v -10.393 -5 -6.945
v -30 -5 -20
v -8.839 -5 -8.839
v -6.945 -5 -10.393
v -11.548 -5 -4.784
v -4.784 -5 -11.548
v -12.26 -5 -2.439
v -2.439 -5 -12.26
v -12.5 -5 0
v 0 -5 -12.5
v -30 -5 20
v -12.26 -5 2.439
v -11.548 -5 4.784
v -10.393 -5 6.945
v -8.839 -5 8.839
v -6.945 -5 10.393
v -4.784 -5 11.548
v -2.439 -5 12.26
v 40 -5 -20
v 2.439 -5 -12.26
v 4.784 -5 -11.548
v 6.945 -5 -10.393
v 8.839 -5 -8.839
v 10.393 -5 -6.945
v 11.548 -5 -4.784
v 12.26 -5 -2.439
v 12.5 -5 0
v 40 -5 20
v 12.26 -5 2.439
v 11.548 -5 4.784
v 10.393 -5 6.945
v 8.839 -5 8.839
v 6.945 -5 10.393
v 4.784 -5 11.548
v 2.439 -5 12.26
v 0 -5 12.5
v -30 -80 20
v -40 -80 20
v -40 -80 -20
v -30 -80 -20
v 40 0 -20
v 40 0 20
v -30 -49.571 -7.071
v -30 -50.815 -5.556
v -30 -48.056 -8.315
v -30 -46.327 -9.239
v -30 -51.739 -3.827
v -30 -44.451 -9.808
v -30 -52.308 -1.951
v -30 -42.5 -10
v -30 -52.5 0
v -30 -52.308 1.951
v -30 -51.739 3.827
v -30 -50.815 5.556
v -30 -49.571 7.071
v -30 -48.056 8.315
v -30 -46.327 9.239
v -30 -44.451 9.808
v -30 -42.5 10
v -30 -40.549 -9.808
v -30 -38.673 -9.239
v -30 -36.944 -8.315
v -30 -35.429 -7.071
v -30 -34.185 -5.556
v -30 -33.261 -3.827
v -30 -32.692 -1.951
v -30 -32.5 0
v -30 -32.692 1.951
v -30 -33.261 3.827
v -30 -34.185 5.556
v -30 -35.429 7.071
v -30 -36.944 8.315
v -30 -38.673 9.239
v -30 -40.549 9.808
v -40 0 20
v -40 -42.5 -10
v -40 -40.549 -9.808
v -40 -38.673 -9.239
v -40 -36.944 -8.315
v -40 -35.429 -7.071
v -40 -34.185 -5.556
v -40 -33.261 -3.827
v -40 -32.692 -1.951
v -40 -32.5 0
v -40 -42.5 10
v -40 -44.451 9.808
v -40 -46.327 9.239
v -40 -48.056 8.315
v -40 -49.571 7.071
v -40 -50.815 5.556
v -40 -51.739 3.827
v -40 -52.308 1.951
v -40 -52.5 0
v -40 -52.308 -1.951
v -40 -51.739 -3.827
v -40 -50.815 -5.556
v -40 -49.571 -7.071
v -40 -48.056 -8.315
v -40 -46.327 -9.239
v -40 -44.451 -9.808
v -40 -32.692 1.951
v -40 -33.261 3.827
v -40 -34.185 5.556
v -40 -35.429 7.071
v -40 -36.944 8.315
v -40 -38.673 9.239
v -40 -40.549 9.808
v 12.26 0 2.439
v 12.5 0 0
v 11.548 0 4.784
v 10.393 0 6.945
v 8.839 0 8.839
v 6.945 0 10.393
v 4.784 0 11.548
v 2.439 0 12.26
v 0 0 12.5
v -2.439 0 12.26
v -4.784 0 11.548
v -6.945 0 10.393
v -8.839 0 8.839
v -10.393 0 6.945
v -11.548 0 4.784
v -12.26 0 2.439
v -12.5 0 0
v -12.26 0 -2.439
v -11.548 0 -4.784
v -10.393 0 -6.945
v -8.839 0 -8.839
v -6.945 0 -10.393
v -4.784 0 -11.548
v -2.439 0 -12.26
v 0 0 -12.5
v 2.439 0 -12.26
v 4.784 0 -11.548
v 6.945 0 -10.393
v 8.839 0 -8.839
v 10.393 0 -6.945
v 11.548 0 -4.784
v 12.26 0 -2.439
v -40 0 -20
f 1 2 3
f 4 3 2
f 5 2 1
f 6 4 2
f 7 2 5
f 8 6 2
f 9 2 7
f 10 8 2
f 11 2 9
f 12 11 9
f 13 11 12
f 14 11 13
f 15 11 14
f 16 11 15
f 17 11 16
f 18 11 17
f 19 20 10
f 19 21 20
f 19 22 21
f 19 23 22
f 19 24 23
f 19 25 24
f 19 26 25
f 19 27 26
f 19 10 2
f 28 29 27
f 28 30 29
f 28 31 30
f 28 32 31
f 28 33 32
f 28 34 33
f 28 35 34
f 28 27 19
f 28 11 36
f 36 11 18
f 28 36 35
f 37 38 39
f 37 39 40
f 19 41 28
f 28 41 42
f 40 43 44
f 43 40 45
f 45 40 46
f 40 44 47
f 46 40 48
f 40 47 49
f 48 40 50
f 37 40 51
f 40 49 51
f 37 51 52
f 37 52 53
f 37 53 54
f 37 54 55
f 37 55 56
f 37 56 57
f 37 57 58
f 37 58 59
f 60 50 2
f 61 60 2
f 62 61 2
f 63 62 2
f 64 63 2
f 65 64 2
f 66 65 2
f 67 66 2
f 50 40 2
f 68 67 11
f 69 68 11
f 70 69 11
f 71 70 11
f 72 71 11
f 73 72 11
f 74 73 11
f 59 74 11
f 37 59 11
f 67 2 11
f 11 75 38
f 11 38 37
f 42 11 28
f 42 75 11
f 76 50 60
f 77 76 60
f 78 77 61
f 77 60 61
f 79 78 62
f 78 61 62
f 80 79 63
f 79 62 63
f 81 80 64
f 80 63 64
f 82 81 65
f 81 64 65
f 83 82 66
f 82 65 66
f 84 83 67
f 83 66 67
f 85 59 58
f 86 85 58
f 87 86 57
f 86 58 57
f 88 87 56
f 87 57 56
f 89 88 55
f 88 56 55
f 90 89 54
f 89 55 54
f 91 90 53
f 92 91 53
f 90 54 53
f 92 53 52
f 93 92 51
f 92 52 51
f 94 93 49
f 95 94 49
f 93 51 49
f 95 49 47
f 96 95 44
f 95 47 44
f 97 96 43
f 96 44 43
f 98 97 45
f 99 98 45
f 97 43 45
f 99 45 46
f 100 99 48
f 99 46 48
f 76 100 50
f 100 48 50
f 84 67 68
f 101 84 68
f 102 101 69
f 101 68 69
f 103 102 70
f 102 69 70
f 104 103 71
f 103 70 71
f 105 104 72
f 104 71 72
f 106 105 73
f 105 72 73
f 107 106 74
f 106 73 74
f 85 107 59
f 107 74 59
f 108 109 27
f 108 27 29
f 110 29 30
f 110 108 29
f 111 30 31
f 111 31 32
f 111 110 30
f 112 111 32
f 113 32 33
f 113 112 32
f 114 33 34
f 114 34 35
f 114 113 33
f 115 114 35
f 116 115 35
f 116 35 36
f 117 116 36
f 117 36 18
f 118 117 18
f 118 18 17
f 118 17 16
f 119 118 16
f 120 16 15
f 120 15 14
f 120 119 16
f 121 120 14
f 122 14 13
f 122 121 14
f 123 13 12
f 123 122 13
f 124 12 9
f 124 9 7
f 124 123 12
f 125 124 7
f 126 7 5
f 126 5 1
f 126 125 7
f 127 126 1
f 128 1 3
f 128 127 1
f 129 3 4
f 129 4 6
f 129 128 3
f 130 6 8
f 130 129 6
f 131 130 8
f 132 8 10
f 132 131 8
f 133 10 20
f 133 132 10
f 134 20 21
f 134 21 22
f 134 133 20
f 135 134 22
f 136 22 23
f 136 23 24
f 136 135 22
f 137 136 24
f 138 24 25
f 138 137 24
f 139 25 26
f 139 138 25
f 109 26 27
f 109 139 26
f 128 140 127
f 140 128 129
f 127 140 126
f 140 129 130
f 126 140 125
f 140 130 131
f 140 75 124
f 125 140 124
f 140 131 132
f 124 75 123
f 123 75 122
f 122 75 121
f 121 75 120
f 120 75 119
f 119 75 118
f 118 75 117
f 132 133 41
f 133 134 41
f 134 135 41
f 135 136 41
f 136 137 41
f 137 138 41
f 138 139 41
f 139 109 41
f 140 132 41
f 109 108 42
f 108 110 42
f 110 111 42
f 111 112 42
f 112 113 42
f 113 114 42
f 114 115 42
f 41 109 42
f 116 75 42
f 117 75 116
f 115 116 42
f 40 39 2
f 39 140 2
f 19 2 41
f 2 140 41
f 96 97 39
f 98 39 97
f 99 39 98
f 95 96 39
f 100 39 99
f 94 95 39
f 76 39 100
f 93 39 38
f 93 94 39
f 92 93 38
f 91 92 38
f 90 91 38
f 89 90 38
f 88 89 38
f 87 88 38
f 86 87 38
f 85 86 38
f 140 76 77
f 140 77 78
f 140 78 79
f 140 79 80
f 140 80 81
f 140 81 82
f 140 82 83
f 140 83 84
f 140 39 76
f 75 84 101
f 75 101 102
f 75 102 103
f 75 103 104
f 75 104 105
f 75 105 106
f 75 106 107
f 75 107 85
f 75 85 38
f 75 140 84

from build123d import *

# Parameters (mm, degrees)
F0_W     = 80
F0_H     = 40
F0_R     = 12.5
F1_DEPTH = 5
F2_W     = 10
F2_H     = 40
F3_DEPTH = 75
F5_DEPTH = 10.001


with BuildPart() as f1:
    # F0 (on Front) → F1 (new body)
    with BuildSketch(Plane.XZ):
        Rectangle(F0_W, F0_H)
        Circle(F0_R, mode=Mode.SUBTRACT)
    extrude(amount=F1_DEPTH)

    # F2 (on face) → F3 (join)
    with BuildSketch(Plane.XZ.offset(5)):
        with Locations((-35, 0)):
            Rectangle(F2_W, F2_H)
    extrude(amount=F3_DEPTH)

    # F4 (on face) → F5 (cut, through all)
    with BuildSketch(Plane.YZ.offset(-30)):
        with BuildLine():
            ThreePointArc((-32.5, 0), (-35.4289321881, 7.0710678119), (-42.5, 10))
            Line((-42.5, 10), (-42.5, -10))
            ThreePointArc((-42.5, -10), (-35.4289321881, -7.0710678119), (-32.5, 0))
        make_face()
        with BuildLine():
            Line((-42.5, -10), (-42.5, 10))
            ThreePointArc((-42.5, 10), (-52.5, 0), (-42.5, -10))
        make_face()
    extrude(amount=-F5_DEPTH, mode=Mode.SUBTRACT)


solid = f1.part
